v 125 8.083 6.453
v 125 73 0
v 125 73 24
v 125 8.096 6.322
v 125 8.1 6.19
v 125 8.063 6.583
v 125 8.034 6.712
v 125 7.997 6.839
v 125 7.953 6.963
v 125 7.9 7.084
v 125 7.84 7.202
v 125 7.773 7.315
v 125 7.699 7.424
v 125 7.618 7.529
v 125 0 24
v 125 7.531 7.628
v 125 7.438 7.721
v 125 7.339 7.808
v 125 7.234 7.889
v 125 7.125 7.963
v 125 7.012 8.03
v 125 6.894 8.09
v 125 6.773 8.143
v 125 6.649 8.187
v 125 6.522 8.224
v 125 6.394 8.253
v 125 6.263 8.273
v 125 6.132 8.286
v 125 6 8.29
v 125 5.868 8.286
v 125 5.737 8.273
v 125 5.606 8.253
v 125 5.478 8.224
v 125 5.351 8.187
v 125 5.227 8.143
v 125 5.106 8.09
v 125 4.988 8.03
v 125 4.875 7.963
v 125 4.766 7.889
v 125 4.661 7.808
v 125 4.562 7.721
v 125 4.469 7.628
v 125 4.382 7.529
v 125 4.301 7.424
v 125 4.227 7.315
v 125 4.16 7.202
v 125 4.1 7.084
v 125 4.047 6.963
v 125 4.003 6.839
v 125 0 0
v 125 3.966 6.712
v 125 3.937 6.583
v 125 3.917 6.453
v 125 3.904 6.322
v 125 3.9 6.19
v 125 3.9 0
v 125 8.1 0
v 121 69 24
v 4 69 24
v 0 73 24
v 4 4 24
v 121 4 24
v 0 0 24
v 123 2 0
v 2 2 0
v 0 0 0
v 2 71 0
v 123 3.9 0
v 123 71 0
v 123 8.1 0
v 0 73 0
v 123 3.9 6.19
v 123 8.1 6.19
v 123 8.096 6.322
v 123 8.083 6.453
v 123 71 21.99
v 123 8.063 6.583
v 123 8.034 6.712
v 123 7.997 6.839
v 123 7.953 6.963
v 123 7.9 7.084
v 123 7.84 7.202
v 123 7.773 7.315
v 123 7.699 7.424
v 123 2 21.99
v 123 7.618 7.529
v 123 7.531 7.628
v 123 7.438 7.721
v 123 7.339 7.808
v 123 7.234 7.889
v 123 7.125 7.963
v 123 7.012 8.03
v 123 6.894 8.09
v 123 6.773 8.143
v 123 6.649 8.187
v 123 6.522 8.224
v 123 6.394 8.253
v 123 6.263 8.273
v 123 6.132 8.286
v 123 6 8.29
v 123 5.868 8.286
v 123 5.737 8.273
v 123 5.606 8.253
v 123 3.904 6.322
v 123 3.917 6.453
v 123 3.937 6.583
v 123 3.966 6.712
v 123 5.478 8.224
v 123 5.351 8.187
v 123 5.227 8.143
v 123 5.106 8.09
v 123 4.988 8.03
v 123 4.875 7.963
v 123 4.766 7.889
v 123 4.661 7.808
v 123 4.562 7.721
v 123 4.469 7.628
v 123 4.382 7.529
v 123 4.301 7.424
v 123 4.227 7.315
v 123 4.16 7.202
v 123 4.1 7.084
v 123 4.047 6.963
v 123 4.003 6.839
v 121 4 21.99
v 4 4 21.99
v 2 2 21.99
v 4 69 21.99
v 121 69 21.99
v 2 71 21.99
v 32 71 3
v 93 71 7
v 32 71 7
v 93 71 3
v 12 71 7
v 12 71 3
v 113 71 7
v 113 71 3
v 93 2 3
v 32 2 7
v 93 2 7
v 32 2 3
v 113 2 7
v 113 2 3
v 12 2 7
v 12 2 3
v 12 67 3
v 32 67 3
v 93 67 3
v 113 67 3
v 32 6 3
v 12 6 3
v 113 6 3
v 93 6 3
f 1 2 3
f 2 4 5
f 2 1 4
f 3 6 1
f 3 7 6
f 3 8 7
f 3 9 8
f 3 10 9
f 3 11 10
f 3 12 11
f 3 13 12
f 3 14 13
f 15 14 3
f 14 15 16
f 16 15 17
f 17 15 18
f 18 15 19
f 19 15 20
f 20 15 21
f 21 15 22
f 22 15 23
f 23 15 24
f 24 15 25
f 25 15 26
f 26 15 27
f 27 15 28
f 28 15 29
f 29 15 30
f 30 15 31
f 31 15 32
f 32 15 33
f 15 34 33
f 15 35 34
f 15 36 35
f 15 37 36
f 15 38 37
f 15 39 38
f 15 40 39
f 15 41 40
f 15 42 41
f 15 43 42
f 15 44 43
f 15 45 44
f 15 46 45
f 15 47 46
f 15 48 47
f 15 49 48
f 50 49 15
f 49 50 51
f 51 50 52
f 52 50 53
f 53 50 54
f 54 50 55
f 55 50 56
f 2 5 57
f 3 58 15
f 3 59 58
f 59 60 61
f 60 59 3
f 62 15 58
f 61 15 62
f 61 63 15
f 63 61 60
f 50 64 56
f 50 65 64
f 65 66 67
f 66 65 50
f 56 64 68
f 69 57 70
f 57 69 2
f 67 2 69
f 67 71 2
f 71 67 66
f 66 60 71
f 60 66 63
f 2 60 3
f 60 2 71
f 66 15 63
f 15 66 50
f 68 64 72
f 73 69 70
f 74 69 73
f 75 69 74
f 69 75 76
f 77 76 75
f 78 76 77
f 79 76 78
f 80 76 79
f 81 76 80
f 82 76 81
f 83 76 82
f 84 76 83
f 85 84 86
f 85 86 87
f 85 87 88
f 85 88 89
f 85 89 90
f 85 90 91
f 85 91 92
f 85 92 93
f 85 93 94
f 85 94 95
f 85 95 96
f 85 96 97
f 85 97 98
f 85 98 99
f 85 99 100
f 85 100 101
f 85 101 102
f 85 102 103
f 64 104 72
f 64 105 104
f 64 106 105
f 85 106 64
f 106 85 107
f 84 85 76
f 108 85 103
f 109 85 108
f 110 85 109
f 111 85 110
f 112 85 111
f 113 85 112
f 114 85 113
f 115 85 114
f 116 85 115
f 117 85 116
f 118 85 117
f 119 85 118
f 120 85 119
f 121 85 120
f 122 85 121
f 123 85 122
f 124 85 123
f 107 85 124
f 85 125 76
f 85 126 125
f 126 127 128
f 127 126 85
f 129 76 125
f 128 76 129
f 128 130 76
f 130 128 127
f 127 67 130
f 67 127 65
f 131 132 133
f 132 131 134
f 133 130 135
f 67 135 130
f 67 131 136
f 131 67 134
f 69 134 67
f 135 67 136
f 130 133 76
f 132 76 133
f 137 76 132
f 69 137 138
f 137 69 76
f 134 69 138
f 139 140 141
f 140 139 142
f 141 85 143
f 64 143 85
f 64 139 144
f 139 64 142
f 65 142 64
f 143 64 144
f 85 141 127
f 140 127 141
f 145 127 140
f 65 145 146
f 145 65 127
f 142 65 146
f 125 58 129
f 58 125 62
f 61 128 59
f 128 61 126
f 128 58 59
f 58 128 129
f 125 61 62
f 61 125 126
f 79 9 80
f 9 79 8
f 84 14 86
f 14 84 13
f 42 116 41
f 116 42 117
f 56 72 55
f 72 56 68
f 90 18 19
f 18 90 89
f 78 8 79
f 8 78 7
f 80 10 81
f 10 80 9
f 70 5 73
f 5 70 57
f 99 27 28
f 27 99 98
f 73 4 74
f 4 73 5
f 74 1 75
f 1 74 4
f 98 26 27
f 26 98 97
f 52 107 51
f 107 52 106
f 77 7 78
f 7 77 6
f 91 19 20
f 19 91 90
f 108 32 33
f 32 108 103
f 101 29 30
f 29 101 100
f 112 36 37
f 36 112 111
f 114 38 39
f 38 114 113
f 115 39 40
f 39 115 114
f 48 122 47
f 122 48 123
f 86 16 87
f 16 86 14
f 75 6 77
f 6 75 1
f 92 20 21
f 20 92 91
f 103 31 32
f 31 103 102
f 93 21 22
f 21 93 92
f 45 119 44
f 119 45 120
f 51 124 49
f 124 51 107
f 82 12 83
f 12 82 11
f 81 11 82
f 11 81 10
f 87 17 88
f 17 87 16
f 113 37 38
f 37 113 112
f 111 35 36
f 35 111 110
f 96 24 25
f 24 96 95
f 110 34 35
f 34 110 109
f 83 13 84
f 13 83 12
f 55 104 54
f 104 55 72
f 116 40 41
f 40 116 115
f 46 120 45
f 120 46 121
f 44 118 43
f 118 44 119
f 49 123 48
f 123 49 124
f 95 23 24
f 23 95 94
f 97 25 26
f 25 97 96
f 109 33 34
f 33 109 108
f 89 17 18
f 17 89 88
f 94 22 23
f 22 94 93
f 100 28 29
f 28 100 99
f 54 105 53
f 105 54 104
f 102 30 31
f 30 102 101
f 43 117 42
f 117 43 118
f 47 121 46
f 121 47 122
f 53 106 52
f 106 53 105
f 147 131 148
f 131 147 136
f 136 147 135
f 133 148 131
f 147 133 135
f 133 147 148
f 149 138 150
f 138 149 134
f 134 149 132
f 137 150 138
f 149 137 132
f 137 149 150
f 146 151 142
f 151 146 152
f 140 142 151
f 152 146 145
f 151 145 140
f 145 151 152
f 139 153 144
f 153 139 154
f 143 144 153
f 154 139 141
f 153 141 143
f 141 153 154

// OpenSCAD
preview = 0.01;
$fn = 100;

// innere Maße
breite = 121.0;
hoehe = 69.0;
tiefe = 20.0;
dicke = 2.0;
lochDia = 4.2;
lochAbstand = 4.0;

difference() {
    // aussen
    cube([breite+2*dicke, hoehe+2*dicke, tiefe+2*dicke]);
    // innen
    translate([dicke, dicke, -preview]) {
        cube([breite, hoehe, tiefe+dicke]); 
    }
    // oben
    translate([dicke*2, dicke*2, tiefe-preview]) {
        cube([breite-2*dicke, hoehe-2*dicke, dicke*2+2*preview]);
    }
    // kabel aussparung
    translate([breite+dicke-preview, dicke+lochAbstand, -preview+dicke+lochDia]){
        rotate([0, 90, 0])
        hull(){
            cylinder(d=lochDia, h=dicke+2*preview);
            translate([dicke+lochDia, 0, 0])
                cylinder(d=lochDia, h=dicke+2*preview);
        }
    }
}
// 3mm nubsel abstand
nubselBreite = 20;
nublselAbstand = 10;
translate([dicke+nublselAbstand, dicke, 3]) nubsel();
translate([breite+dicke-nubselBreite-nublselAbstand, dicke, 3]) nubsel();
rotate([0, 0, 180]) {
    translate([-dicke-nubselBreite-nublselAbstand, -hoehe-dicke, 3]) nubsel();
    translate([-dicke-breite+nublselAbstand, -hoehe-dicke, 3]) nubsel();
}

module nubsel() {
    // hilfe für polyhedron
    CubePoints = [  [  0,  0,  0 ],  //0
                    [ 20,  0,  0 ],  //1
                    [ 20,  4,  0 ],  //2
                    [  0,  4,  0 ],  //3
                    [  0,  0,  4 ],  //4
                    [ 20,  0,  4 ],  //5
                    [ 20,  0,  4 ],  //6
                    [  0,  0,  4 ]]; //7

  CubeFaces = [ [0, 1, 2, 3],  // bottom
                [4, 5, 1, 0],  // front
                [7, 6, 5, 4],  // top
                [5, 6, 2, 1],  // right
                [6, 7, 3, 2],  // back
                [7, 4, 0, 3]]; // left

  polyhedron(CubePoints, CubeFaces);
}
